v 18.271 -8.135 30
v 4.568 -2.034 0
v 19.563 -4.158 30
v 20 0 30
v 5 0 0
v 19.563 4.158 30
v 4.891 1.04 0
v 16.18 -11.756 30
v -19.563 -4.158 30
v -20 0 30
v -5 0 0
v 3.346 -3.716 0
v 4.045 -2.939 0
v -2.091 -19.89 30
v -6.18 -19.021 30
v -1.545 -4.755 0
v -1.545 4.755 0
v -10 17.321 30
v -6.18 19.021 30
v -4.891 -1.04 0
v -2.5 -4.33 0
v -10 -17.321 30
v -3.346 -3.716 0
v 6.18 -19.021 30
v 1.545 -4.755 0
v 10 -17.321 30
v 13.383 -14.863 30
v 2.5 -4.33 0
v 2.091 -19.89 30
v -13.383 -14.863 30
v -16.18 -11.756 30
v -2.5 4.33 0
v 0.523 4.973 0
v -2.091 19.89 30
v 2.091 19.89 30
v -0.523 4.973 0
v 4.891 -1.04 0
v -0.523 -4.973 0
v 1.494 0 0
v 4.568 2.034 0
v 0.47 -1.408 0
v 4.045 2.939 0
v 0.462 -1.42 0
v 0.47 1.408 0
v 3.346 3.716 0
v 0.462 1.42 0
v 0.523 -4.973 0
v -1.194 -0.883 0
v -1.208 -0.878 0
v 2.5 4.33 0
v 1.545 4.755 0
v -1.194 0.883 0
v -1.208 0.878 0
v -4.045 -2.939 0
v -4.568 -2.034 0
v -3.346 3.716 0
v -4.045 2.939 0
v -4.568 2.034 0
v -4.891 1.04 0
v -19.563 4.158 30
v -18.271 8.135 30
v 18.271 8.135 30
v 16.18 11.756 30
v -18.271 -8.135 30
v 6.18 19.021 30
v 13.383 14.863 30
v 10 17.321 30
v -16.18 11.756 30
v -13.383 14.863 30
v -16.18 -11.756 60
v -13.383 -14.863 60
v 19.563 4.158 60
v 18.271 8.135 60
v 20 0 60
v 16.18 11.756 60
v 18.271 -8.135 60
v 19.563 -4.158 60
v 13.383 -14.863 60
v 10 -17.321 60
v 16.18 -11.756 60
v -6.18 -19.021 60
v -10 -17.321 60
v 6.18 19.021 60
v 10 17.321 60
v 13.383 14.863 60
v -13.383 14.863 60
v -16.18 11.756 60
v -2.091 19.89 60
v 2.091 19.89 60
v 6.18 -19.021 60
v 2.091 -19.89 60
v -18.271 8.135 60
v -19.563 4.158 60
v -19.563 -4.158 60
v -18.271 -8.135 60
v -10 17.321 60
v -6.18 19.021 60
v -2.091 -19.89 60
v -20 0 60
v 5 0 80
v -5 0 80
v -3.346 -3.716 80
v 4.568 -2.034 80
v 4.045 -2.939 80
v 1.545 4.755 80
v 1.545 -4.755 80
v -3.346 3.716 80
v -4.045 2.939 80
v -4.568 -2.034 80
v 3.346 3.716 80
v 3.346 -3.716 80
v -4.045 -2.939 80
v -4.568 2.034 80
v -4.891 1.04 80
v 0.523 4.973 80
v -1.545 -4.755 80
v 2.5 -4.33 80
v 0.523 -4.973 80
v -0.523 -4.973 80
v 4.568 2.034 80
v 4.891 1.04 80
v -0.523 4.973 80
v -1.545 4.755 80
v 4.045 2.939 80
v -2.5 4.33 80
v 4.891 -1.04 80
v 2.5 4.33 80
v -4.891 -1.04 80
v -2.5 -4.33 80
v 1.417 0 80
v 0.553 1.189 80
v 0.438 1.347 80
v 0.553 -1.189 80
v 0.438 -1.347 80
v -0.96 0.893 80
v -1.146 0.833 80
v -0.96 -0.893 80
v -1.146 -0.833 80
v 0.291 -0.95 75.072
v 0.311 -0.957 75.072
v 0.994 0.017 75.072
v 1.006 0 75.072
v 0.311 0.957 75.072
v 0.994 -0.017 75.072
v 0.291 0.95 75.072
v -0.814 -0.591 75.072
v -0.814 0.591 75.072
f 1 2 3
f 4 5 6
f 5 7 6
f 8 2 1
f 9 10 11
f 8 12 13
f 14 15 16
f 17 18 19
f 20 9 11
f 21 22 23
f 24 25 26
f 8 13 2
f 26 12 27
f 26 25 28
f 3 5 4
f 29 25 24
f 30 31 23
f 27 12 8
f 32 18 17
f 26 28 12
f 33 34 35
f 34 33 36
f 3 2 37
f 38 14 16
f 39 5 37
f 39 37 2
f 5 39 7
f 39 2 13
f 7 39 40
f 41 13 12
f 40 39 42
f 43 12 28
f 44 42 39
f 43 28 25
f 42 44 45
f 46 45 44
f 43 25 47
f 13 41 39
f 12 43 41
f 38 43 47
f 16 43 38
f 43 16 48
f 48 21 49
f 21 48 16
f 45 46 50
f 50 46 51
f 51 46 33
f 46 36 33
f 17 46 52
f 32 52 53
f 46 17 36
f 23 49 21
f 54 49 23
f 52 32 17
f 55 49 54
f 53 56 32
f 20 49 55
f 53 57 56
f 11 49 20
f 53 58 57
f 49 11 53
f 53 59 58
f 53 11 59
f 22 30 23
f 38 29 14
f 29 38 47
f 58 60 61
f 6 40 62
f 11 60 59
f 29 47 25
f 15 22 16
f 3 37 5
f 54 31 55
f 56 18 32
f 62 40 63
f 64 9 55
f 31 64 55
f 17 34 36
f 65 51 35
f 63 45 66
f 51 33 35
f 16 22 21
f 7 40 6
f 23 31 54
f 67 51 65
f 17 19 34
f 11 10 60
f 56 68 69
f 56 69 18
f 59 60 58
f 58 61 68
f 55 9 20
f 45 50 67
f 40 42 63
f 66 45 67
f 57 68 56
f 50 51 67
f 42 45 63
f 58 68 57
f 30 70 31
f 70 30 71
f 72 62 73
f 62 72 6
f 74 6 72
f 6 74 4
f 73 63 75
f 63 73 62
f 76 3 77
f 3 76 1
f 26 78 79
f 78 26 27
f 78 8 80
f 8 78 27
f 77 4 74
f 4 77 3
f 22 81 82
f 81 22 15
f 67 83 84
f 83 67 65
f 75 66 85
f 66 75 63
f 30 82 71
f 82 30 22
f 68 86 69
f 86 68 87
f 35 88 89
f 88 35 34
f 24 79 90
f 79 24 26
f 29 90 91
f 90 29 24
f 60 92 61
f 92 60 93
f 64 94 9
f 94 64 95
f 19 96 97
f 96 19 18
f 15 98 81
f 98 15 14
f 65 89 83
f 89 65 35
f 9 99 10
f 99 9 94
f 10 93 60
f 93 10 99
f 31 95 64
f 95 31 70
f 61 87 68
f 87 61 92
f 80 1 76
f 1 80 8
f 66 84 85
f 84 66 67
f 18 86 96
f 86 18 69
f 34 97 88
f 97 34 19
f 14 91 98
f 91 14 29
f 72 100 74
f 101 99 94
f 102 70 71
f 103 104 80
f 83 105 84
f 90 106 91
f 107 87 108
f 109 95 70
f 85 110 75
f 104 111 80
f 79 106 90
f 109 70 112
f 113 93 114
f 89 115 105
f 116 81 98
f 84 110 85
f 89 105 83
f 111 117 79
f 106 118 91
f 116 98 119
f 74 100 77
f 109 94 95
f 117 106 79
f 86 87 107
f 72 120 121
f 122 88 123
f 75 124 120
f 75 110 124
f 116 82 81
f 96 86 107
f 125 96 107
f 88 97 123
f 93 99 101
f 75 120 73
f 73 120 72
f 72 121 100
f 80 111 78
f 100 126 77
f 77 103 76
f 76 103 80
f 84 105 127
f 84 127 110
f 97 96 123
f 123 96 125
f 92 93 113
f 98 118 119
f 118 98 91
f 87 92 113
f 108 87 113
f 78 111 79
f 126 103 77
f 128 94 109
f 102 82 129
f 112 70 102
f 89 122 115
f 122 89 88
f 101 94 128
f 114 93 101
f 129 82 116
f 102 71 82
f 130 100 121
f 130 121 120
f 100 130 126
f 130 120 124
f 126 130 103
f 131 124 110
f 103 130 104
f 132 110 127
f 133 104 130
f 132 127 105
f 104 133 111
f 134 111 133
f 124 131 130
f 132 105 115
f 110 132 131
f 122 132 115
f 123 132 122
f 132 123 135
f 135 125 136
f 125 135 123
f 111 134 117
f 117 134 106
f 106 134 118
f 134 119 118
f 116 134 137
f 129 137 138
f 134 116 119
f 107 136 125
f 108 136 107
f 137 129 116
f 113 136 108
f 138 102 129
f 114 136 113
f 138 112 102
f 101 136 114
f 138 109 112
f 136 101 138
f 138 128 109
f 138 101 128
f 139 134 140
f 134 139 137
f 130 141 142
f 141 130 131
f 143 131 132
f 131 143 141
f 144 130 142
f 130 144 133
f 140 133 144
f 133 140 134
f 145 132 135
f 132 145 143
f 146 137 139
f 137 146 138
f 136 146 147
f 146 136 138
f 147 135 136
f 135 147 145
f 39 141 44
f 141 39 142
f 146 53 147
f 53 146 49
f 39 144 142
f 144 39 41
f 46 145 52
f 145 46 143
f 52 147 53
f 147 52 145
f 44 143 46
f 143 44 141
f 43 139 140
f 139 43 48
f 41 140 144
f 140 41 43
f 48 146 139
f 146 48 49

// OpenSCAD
module dobber();
//rubber dia 3 midd
//rubber dia 1.5 end
//rubber len 4.5
{
    difference()
 {
   union()
  {
difference()
 {
	union()
  {
		translate([0,0,0])
	cylinder(h=30,r1=5,r2=20,center=false);
		translate([0,0,30])
	cylinder(h=30,r1=20,r2=20,center=false);
		translate([0,0,60])
	cylinder(h=20,r1=20,r2=5,center=false);
    }
 }
 }
 
 	union()
  {
    //4 gat
              translate([0,0,75])
    cylinder(h=6,r1=1,r2=1.5,center=false);
        translate([0,0,-1])
    cylinder(h=77,r1=1.5,r2=1,center=false);
  }
  }
}
